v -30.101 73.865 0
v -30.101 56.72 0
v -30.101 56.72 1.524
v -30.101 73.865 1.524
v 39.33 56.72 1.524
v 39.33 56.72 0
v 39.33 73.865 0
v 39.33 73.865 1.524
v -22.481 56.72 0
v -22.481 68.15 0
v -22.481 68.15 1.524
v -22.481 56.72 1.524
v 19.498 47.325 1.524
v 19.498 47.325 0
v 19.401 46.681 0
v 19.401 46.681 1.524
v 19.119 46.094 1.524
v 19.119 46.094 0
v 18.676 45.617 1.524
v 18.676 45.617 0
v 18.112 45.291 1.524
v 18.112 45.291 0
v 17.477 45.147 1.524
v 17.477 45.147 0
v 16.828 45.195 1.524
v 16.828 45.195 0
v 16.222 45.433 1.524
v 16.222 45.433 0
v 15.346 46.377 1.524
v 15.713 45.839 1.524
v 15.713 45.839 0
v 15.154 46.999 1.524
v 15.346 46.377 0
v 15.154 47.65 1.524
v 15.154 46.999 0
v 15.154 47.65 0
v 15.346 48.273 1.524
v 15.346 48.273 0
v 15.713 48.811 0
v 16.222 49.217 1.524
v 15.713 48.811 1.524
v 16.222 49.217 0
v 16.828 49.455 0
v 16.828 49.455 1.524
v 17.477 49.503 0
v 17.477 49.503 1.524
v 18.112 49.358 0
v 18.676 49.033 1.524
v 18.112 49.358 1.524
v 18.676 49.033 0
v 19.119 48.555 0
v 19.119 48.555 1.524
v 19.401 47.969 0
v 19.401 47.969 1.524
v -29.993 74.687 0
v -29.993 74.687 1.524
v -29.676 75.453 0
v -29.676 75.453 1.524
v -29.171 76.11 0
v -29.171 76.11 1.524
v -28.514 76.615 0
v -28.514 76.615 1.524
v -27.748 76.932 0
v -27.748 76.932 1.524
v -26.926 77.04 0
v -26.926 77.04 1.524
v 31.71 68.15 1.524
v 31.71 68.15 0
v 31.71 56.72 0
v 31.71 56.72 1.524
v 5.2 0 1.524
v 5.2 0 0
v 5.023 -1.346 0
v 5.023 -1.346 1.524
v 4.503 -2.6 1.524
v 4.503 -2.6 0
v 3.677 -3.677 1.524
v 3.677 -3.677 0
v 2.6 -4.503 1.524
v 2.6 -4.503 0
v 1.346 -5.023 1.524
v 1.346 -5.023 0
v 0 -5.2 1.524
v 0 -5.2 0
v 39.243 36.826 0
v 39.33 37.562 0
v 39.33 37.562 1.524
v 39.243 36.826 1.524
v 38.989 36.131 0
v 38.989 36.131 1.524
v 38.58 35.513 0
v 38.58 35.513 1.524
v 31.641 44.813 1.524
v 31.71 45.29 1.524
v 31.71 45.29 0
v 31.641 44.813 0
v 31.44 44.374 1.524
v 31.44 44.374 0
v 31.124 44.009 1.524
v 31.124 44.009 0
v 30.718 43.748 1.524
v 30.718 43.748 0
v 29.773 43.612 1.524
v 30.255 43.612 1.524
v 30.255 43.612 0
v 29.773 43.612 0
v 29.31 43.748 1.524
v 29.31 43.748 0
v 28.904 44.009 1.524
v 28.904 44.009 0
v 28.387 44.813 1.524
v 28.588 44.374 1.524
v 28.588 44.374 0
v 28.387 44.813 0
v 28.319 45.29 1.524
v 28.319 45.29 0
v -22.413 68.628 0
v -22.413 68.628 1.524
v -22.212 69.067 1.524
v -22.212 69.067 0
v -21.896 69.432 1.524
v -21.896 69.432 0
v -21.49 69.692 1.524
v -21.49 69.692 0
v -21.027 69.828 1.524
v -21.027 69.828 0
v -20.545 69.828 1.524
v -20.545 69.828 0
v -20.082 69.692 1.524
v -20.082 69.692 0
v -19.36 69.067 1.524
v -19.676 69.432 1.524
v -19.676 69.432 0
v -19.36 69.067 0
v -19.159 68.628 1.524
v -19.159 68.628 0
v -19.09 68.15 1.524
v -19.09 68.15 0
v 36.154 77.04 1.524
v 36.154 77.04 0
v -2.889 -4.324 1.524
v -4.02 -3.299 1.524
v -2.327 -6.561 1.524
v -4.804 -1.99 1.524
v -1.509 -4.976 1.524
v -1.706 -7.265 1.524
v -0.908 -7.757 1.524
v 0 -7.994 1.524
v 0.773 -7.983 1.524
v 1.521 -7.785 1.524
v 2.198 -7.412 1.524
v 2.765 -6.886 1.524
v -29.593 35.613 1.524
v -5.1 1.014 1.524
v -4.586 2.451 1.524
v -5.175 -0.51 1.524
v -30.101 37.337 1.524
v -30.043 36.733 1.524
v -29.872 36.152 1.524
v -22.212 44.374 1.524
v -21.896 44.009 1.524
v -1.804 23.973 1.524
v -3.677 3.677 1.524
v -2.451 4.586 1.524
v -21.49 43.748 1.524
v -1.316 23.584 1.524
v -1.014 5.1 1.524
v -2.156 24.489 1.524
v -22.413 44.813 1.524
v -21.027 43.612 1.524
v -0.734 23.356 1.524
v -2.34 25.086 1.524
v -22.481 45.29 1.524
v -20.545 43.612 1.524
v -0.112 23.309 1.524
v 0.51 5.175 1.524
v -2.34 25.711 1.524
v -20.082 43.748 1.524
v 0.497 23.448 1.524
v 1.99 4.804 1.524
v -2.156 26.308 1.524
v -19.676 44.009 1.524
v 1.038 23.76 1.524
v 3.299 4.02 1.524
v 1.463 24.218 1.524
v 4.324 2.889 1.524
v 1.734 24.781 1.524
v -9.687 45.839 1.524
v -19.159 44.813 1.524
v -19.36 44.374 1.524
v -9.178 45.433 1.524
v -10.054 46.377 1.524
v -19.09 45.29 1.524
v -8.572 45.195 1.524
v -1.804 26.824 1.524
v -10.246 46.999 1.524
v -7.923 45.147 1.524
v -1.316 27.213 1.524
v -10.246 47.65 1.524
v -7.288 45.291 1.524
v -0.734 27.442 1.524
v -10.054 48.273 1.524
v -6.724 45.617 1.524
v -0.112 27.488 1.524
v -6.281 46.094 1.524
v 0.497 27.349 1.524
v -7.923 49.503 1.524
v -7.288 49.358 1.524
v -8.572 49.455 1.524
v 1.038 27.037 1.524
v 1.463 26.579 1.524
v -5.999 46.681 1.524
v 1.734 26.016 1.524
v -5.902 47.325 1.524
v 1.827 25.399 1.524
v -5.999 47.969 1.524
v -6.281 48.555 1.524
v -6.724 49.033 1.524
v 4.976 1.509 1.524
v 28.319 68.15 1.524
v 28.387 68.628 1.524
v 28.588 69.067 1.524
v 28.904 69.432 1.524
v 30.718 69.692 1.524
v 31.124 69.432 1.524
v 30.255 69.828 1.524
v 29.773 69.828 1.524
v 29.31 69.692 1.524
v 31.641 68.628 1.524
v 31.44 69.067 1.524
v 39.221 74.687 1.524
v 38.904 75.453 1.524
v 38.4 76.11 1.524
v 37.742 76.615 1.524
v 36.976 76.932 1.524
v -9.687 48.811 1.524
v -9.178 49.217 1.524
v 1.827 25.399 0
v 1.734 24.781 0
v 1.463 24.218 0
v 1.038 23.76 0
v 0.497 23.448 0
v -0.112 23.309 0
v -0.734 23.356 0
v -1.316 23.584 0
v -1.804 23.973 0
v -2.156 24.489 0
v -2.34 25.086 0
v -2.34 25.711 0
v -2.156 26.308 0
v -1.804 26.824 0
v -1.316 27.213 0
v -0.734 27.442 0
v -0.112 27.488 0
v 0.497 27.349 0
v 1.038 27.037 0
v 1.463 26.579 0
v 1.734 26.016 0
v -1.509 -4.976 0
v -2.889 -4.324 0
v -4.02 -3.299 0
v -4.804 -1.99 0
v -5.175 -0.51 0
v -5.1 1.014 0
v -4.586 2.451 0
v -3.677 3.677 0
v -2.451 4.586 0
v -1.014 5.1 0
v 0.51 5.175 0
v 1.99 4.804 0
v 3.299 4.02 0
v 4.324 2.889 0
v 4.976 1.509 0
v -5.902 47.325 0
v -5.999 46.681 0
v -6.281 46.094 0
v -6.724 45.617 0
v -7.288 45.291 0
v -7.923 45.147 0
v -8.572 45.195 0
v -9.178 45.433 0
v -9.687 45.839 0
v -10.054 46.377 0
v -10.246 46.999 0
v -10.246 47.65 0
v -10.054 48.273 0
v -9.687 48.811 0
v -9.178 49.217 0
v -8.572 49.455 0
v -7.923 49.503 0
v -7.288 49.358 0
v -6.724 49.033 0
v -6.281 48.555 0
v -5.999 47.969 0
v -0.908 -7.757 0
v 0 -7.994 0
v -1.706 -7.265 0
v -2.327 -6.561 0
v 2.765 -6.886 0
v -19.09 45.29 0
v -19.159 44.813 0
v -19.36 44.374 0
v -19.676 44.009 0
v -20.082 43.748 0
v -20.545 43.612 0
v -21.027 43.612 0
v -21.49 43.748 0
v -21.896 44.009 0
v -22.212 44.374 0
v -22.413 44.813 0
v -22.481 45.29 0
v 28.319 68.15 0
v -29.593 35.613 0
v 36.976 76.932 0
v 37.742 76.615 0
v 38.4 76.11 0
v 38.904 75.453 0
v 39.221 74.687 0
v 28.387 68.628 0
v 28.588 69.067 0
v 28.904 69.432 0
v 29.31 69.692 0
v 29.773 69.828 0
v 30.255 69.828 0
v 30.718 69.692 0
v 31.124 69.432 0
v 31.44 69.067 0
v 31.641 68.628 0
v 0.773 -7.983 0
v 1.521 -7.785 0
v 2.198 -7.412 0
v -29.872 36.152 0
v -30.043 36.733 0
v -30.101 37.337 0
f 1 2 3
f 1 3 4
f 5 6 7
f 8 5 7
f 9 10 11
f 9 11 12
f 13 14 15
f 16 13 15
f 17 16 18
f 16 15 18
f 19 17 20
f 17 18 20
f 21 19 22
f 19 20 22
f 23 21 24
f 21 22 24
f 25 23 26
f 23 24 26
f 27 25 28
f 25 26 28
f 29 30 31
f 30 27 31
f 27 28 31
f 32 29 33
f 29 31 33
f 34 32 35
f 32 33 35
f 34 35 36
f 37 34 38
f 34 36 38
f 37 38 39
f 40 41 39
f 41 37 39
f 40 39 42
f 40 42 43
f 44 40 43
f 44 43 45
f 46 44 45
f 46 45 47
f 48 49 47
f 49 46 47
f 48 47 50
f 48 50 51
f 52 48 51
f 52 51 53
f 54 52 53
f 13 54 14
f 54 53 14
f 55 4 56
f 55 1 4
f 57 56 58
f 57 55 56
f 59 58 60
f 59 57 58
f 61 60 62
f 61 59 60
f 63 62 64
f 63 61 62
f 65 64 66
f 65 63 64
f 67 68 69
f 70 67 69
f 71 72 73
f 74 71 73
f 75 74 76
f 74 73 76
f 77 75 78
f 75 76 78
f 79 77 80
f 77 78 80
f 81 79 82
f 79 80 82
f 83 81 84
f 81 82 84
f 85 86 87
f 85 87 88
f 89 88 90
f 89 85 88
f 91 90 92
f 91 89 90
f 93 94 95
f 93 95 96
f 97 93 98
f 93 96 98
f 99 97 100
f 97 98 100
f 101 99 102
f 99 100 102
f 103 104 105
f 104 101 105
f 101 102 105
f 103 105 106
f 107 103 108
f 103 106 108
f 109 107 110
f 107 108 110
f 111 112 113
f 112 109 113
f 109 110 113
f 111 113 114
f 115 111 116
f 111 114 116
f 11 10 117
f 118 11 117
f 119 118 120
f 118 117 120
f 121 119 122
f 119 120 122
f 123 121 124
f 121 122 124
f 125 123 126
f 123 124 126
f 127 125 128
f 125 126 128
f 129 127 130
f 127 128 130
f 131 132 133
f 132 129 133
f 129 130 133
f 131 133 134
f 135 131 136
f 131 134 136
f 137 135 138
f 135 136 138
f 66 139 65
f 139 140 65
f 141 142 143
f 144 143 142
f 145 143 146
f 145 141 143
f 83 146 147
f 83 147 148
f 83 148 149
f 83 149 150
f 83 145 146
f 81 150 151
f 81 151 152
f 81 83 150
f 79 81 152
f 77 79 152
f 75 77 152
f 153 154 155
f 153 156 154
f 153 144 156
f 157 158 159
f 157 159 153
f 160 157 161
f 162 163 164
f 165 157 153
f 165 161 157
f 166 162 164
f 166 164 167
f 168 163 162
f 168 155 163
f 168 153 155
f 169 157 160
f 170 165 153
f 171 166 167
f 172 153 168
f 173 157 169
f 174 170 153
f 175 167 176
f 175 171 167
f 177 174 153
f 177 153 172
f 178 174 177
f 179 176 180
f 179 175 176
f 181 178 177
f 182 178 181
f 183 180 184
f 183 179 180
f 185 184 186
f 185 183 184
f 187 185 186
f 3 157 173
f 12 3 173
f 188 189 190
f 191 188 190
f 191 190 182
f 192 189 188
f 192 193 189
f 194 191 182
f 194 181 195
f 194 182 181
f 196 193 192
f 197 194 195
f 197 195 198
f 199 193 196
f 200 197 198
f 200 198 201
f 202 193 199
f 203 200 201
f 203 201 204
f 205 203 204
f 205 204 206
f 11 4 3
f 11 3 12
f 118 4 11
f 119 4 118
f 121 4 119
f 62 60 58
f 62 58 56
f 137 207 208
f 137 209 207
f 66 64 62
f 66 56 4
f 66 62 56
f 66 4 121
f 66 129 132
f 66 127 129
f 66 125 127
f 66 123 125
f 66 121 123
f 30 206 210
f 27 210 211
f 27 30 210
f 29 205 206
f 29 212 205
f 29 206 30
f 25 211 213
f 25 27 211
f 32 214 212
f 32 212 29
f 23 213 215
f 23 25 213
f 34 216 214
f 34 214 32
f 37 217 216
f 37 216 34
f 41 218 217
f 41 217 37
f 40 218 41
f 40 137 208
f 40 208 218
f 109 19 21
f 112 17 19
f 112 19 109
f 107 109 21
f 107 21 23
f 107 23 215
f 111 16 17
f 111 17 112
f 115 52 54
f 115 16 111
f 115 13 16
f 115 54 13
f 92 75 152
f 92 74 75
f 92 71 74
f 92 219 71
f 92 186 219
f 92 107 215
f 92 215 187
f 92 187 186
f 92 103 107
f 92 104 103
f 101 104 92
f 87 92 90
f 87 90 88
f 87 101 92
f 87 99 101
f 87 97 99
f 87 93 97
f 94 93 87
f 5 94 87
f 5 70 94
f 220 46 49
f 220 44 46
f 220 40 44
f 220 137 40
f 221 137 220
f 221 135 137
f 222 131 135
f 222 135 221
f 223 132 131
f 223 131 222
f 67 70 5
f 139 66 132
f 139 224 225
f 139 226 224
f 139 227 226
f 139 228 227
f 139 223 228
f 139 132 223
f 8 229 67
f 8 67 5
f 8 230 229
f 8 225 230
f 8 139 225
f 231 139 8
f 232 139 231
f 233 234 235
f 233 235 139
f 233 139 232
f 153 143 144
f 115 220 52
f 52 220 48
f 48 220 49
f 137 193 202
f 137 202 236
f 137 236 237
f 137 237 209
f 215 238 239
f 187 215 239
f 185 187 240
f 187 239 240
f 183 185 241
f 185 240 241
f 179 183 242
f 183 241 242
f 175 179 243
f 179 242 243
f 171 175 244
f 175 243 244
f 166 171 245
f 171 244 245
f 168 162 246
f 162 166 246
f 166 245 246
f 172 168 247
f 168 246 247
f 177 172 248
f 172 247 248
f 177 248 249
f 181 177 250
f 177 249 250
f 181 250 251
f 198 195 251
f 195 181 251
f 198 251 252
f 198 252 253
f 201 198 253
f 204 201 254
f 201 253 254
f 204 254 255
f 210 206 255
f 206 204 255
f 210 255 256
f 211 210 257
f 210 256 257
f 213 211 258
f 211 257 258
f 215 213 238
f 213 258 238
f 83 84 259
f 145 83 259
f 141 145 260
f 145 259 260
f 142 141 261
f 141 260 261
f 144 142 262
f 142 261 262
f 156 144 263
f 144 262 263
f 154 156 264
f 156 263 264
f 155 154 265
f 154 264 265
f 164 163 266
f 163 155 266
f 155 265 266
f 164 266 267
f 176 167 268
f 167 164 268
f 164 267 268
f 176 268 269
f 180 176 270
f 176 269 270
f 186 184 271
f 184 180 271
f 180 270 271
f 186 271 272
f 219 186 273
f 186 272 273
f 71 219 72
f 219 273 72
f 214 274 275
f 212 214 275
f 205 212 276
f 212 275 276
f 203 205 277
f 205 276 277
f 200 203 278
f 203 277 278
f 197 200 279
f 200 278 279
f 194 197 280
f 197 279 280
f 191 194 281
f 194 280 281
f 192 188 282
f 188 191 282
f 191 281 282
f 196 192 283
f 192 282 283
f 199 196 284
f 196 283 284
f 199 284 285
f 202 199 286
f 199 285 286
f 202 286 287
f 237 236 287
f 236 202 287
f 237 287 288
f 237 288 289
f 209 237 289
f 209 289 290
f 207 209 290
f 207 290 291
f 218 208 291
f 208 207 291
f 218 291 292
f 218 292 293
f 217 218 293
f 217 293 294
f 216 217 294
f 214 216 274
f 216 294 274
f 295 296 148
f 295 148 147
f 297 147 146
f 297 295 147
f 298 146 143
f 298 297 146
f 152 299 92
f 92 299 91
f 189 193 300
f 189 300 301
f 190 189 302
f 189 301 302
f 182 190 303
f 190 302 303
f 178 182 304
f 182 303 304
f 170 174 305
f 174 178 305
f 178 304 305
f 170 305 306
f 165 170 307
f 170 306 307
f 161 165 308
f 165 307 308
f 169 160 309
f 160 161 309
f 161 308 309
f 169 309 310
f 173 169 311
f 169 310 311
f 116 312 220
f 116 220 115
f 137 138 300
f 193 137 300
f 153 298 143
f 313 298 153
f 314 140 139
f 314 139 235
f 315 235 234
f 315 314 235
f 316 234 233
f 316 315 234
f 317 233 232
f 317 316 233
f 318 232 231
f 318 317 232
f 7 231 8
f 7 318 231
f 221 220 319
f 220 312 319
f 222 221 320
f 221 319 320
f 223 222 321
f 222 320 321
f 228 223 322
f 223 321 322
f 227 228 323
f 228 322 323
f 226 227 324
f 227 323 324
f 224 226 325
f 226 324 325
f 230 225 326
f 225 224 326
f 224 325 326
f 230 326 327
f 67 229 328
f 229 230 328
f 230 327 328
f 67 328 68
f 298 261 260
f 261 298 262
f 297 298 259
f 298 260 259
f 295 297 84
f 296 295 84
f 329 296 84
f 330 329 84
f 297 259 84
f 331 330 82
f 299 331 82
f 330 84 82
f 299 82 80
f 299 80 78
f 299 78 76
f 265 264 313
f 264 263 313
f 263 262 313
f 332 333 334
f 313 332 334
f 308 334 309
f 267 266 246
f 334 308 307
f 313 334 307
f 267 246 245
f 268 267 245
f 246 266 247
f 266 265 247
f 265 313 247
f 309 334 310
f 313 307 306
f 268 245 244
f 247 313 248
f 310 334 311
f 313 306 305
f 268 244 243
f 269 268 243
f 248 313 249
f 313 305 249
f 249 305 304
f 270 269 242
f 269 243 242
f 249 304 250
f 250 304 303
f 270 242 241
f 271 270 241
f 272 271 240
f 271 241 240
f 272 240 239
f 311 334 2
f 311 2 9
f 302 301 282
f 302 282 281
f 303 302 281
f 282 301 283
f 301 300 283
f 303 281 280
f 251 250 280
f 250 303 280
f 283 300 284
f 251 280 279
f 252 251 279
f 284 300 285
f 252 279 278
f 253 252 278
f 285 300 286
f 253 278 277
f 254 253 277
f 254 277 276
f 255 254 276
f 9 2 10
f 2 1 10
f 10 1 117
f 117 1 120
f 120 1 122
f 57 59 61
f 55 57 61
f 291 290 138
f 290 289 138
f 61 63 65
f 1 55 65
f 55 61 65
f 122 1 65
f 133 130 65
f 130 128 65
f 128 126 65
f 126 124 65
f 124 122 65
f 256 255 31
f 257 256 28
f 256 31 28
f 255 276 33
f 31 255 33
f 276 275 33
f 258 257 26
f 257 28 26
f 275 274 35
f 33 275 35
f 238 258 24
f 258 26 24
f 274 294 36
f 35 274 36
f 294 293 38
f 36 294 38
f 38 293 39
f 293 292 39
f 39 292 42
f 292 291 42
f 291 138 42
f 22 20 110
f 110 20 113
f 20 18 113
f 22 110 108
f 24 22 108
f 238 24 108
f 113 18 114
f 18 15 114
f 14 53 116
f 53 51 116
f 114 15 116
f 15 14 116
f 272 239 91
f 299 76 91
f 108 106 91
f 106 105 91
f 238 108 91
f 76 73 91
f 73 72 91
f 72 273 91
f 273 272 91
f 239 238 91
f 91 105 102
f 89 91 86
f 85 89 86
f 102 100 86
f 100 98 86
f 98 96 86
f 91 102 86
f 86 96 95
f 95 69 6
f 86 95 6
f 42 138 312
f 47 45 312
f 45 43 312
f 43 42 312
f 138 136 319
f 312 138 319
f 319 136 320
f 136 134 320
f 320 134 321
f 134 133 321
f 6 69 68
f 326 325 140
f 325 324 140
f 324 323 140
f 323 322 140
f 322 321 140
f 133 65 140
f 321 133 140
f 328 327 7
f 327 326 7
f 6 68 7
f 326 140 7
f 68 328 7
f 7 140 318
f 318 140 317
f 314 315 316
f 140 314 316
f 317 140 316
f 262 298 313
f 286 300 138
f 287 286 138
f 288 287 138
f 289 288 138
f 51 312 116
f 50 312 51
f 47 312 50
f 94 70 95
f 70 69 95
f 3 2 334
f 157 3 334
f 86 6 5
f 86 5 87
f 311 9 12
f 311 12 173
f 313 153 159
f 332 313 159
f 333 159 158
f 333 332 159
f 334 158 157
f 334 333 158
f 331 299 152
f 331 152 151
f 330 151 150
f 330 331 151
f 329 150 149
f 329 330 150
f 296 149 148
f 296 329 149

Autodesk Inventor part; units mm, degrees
ref_plane "YZ Plane" through (0, 0, 0) normal (1, 0, 0) x (0, 1, 0)
ref_plane "XZ Plane" through (0, 0, 0) normal (0, 1, 0) x (-1, 0, 0)
ref_plane "XY Plane" through (0, 0, 0) normal (0, 0, 1) x (1, 0, 0)
sketch "Sketch1" plane through (0, 0, 0) normal (0, 0, 1) x (1, 0, 0)
  circle A0 centre (-0.2682, 25.3986) radius 2.0955
  circle A1 centre (0, 0) radius 5.2 projected
  line L0 (-19.0905, 68.1502) -> (-19.0905, 45.2902)
  line L1 (-22.4814, 68.1502) -> (-22.4814, 45.2902)
  line L2 (28.3186, 68.1502) -> (28.3186, 45.2902)
  line L3 (31.7095, 68.1502) -> (31.7095, 45.2902)
  arc A2 (-19.0905, 68.1502) -> (-22.4814, 68.1502) centre (-20.7859, 68.1502) ccw
  arc A3 (-22.4814, 45.2902) -> (-19.0905, 45.2902) centre (-20.7859, 45.2902) ccw
  arc A4 (31.7095, 68.1502) -> (28.3186, 68.1502) centre (30.0141, 68.1502) ccw
  arc A5 (28.3186, 45.2902) -> (31.7095, 45.2902) centre (30.0141, 45.2902) ccw
  line L4 (-22.4814, 56.7202) -> (-30.1014, 56.7202)
  line L5 (-30.1014, 56.7202) -> (-30.1014, 73.8652)
  line L6 (31.7095, 56.7202) -> (39.3295, 56.7202)
  line L7 (39.3295, 56.7202) -> (39.3295, 73.8652)
  line L8 (36.1545, 77.0402) -> (-26.9264, 77.0402)
  line L9 (-30.1014, 56.7202) -> (-30.1014, 37.3371)
  line L10 (39.3295, 56.7202) -> (39.3295, 37.5617)
  line L11 (0, 0) -> (0, -10.16)
  line L12 (-2.3266, -6.5613) -> (-29.5927, 35.6134)
  line L13 (2.7652, -6.8864) -> (38.58, 35.5129)
  arc A6 (-30.1014, 37.3371) -> (-29.5927, 35.6134) centre (-26.9264, 37.3371) ccw
  arc A7 (-26.9264, 77.0402) -> (-30.1014, 73.8652) centre (-26.9264, 73.8652) ccw
  arc A8 (39.3295, 73.8652) -> (36.1545, 77.0402) centre (36.1545, 73.8652) ccw
  arc A9 (38.58, 35.5129) -> (39.3295, 37.5617) centre (36.1545, 37.5617) ccw
  arc A10 (-2.3266, -6.5613) -> (2.7652, -6.8864) centre (0.3398, -4.8376) ccw
  circle A11 centre (-8.0859, 47.3249) radius 2.1844 projected
  circle A12 centre (17.3141, 47.3249) radius 2.1844 projected
  point P0 (0, 0)
  point P1 (-30.1014, 77.0402)
  point P2 (-30.1014, 36.4002)
  point P3 (39.3295, 36.4002)
  dimension "d5" = 7.62
  dimension "d6" = 20.32
  dimension "d7" = 7.62
  dimension "d8" = 20.32
  dimension "d9" = 20.32
  dimension "d10" = 10.16
  dimension "d11" = 3.175
  dimension "d12" = 4.191
extrude "Extrusion1" add sketch "Sketch1" along normal blind 1.524
